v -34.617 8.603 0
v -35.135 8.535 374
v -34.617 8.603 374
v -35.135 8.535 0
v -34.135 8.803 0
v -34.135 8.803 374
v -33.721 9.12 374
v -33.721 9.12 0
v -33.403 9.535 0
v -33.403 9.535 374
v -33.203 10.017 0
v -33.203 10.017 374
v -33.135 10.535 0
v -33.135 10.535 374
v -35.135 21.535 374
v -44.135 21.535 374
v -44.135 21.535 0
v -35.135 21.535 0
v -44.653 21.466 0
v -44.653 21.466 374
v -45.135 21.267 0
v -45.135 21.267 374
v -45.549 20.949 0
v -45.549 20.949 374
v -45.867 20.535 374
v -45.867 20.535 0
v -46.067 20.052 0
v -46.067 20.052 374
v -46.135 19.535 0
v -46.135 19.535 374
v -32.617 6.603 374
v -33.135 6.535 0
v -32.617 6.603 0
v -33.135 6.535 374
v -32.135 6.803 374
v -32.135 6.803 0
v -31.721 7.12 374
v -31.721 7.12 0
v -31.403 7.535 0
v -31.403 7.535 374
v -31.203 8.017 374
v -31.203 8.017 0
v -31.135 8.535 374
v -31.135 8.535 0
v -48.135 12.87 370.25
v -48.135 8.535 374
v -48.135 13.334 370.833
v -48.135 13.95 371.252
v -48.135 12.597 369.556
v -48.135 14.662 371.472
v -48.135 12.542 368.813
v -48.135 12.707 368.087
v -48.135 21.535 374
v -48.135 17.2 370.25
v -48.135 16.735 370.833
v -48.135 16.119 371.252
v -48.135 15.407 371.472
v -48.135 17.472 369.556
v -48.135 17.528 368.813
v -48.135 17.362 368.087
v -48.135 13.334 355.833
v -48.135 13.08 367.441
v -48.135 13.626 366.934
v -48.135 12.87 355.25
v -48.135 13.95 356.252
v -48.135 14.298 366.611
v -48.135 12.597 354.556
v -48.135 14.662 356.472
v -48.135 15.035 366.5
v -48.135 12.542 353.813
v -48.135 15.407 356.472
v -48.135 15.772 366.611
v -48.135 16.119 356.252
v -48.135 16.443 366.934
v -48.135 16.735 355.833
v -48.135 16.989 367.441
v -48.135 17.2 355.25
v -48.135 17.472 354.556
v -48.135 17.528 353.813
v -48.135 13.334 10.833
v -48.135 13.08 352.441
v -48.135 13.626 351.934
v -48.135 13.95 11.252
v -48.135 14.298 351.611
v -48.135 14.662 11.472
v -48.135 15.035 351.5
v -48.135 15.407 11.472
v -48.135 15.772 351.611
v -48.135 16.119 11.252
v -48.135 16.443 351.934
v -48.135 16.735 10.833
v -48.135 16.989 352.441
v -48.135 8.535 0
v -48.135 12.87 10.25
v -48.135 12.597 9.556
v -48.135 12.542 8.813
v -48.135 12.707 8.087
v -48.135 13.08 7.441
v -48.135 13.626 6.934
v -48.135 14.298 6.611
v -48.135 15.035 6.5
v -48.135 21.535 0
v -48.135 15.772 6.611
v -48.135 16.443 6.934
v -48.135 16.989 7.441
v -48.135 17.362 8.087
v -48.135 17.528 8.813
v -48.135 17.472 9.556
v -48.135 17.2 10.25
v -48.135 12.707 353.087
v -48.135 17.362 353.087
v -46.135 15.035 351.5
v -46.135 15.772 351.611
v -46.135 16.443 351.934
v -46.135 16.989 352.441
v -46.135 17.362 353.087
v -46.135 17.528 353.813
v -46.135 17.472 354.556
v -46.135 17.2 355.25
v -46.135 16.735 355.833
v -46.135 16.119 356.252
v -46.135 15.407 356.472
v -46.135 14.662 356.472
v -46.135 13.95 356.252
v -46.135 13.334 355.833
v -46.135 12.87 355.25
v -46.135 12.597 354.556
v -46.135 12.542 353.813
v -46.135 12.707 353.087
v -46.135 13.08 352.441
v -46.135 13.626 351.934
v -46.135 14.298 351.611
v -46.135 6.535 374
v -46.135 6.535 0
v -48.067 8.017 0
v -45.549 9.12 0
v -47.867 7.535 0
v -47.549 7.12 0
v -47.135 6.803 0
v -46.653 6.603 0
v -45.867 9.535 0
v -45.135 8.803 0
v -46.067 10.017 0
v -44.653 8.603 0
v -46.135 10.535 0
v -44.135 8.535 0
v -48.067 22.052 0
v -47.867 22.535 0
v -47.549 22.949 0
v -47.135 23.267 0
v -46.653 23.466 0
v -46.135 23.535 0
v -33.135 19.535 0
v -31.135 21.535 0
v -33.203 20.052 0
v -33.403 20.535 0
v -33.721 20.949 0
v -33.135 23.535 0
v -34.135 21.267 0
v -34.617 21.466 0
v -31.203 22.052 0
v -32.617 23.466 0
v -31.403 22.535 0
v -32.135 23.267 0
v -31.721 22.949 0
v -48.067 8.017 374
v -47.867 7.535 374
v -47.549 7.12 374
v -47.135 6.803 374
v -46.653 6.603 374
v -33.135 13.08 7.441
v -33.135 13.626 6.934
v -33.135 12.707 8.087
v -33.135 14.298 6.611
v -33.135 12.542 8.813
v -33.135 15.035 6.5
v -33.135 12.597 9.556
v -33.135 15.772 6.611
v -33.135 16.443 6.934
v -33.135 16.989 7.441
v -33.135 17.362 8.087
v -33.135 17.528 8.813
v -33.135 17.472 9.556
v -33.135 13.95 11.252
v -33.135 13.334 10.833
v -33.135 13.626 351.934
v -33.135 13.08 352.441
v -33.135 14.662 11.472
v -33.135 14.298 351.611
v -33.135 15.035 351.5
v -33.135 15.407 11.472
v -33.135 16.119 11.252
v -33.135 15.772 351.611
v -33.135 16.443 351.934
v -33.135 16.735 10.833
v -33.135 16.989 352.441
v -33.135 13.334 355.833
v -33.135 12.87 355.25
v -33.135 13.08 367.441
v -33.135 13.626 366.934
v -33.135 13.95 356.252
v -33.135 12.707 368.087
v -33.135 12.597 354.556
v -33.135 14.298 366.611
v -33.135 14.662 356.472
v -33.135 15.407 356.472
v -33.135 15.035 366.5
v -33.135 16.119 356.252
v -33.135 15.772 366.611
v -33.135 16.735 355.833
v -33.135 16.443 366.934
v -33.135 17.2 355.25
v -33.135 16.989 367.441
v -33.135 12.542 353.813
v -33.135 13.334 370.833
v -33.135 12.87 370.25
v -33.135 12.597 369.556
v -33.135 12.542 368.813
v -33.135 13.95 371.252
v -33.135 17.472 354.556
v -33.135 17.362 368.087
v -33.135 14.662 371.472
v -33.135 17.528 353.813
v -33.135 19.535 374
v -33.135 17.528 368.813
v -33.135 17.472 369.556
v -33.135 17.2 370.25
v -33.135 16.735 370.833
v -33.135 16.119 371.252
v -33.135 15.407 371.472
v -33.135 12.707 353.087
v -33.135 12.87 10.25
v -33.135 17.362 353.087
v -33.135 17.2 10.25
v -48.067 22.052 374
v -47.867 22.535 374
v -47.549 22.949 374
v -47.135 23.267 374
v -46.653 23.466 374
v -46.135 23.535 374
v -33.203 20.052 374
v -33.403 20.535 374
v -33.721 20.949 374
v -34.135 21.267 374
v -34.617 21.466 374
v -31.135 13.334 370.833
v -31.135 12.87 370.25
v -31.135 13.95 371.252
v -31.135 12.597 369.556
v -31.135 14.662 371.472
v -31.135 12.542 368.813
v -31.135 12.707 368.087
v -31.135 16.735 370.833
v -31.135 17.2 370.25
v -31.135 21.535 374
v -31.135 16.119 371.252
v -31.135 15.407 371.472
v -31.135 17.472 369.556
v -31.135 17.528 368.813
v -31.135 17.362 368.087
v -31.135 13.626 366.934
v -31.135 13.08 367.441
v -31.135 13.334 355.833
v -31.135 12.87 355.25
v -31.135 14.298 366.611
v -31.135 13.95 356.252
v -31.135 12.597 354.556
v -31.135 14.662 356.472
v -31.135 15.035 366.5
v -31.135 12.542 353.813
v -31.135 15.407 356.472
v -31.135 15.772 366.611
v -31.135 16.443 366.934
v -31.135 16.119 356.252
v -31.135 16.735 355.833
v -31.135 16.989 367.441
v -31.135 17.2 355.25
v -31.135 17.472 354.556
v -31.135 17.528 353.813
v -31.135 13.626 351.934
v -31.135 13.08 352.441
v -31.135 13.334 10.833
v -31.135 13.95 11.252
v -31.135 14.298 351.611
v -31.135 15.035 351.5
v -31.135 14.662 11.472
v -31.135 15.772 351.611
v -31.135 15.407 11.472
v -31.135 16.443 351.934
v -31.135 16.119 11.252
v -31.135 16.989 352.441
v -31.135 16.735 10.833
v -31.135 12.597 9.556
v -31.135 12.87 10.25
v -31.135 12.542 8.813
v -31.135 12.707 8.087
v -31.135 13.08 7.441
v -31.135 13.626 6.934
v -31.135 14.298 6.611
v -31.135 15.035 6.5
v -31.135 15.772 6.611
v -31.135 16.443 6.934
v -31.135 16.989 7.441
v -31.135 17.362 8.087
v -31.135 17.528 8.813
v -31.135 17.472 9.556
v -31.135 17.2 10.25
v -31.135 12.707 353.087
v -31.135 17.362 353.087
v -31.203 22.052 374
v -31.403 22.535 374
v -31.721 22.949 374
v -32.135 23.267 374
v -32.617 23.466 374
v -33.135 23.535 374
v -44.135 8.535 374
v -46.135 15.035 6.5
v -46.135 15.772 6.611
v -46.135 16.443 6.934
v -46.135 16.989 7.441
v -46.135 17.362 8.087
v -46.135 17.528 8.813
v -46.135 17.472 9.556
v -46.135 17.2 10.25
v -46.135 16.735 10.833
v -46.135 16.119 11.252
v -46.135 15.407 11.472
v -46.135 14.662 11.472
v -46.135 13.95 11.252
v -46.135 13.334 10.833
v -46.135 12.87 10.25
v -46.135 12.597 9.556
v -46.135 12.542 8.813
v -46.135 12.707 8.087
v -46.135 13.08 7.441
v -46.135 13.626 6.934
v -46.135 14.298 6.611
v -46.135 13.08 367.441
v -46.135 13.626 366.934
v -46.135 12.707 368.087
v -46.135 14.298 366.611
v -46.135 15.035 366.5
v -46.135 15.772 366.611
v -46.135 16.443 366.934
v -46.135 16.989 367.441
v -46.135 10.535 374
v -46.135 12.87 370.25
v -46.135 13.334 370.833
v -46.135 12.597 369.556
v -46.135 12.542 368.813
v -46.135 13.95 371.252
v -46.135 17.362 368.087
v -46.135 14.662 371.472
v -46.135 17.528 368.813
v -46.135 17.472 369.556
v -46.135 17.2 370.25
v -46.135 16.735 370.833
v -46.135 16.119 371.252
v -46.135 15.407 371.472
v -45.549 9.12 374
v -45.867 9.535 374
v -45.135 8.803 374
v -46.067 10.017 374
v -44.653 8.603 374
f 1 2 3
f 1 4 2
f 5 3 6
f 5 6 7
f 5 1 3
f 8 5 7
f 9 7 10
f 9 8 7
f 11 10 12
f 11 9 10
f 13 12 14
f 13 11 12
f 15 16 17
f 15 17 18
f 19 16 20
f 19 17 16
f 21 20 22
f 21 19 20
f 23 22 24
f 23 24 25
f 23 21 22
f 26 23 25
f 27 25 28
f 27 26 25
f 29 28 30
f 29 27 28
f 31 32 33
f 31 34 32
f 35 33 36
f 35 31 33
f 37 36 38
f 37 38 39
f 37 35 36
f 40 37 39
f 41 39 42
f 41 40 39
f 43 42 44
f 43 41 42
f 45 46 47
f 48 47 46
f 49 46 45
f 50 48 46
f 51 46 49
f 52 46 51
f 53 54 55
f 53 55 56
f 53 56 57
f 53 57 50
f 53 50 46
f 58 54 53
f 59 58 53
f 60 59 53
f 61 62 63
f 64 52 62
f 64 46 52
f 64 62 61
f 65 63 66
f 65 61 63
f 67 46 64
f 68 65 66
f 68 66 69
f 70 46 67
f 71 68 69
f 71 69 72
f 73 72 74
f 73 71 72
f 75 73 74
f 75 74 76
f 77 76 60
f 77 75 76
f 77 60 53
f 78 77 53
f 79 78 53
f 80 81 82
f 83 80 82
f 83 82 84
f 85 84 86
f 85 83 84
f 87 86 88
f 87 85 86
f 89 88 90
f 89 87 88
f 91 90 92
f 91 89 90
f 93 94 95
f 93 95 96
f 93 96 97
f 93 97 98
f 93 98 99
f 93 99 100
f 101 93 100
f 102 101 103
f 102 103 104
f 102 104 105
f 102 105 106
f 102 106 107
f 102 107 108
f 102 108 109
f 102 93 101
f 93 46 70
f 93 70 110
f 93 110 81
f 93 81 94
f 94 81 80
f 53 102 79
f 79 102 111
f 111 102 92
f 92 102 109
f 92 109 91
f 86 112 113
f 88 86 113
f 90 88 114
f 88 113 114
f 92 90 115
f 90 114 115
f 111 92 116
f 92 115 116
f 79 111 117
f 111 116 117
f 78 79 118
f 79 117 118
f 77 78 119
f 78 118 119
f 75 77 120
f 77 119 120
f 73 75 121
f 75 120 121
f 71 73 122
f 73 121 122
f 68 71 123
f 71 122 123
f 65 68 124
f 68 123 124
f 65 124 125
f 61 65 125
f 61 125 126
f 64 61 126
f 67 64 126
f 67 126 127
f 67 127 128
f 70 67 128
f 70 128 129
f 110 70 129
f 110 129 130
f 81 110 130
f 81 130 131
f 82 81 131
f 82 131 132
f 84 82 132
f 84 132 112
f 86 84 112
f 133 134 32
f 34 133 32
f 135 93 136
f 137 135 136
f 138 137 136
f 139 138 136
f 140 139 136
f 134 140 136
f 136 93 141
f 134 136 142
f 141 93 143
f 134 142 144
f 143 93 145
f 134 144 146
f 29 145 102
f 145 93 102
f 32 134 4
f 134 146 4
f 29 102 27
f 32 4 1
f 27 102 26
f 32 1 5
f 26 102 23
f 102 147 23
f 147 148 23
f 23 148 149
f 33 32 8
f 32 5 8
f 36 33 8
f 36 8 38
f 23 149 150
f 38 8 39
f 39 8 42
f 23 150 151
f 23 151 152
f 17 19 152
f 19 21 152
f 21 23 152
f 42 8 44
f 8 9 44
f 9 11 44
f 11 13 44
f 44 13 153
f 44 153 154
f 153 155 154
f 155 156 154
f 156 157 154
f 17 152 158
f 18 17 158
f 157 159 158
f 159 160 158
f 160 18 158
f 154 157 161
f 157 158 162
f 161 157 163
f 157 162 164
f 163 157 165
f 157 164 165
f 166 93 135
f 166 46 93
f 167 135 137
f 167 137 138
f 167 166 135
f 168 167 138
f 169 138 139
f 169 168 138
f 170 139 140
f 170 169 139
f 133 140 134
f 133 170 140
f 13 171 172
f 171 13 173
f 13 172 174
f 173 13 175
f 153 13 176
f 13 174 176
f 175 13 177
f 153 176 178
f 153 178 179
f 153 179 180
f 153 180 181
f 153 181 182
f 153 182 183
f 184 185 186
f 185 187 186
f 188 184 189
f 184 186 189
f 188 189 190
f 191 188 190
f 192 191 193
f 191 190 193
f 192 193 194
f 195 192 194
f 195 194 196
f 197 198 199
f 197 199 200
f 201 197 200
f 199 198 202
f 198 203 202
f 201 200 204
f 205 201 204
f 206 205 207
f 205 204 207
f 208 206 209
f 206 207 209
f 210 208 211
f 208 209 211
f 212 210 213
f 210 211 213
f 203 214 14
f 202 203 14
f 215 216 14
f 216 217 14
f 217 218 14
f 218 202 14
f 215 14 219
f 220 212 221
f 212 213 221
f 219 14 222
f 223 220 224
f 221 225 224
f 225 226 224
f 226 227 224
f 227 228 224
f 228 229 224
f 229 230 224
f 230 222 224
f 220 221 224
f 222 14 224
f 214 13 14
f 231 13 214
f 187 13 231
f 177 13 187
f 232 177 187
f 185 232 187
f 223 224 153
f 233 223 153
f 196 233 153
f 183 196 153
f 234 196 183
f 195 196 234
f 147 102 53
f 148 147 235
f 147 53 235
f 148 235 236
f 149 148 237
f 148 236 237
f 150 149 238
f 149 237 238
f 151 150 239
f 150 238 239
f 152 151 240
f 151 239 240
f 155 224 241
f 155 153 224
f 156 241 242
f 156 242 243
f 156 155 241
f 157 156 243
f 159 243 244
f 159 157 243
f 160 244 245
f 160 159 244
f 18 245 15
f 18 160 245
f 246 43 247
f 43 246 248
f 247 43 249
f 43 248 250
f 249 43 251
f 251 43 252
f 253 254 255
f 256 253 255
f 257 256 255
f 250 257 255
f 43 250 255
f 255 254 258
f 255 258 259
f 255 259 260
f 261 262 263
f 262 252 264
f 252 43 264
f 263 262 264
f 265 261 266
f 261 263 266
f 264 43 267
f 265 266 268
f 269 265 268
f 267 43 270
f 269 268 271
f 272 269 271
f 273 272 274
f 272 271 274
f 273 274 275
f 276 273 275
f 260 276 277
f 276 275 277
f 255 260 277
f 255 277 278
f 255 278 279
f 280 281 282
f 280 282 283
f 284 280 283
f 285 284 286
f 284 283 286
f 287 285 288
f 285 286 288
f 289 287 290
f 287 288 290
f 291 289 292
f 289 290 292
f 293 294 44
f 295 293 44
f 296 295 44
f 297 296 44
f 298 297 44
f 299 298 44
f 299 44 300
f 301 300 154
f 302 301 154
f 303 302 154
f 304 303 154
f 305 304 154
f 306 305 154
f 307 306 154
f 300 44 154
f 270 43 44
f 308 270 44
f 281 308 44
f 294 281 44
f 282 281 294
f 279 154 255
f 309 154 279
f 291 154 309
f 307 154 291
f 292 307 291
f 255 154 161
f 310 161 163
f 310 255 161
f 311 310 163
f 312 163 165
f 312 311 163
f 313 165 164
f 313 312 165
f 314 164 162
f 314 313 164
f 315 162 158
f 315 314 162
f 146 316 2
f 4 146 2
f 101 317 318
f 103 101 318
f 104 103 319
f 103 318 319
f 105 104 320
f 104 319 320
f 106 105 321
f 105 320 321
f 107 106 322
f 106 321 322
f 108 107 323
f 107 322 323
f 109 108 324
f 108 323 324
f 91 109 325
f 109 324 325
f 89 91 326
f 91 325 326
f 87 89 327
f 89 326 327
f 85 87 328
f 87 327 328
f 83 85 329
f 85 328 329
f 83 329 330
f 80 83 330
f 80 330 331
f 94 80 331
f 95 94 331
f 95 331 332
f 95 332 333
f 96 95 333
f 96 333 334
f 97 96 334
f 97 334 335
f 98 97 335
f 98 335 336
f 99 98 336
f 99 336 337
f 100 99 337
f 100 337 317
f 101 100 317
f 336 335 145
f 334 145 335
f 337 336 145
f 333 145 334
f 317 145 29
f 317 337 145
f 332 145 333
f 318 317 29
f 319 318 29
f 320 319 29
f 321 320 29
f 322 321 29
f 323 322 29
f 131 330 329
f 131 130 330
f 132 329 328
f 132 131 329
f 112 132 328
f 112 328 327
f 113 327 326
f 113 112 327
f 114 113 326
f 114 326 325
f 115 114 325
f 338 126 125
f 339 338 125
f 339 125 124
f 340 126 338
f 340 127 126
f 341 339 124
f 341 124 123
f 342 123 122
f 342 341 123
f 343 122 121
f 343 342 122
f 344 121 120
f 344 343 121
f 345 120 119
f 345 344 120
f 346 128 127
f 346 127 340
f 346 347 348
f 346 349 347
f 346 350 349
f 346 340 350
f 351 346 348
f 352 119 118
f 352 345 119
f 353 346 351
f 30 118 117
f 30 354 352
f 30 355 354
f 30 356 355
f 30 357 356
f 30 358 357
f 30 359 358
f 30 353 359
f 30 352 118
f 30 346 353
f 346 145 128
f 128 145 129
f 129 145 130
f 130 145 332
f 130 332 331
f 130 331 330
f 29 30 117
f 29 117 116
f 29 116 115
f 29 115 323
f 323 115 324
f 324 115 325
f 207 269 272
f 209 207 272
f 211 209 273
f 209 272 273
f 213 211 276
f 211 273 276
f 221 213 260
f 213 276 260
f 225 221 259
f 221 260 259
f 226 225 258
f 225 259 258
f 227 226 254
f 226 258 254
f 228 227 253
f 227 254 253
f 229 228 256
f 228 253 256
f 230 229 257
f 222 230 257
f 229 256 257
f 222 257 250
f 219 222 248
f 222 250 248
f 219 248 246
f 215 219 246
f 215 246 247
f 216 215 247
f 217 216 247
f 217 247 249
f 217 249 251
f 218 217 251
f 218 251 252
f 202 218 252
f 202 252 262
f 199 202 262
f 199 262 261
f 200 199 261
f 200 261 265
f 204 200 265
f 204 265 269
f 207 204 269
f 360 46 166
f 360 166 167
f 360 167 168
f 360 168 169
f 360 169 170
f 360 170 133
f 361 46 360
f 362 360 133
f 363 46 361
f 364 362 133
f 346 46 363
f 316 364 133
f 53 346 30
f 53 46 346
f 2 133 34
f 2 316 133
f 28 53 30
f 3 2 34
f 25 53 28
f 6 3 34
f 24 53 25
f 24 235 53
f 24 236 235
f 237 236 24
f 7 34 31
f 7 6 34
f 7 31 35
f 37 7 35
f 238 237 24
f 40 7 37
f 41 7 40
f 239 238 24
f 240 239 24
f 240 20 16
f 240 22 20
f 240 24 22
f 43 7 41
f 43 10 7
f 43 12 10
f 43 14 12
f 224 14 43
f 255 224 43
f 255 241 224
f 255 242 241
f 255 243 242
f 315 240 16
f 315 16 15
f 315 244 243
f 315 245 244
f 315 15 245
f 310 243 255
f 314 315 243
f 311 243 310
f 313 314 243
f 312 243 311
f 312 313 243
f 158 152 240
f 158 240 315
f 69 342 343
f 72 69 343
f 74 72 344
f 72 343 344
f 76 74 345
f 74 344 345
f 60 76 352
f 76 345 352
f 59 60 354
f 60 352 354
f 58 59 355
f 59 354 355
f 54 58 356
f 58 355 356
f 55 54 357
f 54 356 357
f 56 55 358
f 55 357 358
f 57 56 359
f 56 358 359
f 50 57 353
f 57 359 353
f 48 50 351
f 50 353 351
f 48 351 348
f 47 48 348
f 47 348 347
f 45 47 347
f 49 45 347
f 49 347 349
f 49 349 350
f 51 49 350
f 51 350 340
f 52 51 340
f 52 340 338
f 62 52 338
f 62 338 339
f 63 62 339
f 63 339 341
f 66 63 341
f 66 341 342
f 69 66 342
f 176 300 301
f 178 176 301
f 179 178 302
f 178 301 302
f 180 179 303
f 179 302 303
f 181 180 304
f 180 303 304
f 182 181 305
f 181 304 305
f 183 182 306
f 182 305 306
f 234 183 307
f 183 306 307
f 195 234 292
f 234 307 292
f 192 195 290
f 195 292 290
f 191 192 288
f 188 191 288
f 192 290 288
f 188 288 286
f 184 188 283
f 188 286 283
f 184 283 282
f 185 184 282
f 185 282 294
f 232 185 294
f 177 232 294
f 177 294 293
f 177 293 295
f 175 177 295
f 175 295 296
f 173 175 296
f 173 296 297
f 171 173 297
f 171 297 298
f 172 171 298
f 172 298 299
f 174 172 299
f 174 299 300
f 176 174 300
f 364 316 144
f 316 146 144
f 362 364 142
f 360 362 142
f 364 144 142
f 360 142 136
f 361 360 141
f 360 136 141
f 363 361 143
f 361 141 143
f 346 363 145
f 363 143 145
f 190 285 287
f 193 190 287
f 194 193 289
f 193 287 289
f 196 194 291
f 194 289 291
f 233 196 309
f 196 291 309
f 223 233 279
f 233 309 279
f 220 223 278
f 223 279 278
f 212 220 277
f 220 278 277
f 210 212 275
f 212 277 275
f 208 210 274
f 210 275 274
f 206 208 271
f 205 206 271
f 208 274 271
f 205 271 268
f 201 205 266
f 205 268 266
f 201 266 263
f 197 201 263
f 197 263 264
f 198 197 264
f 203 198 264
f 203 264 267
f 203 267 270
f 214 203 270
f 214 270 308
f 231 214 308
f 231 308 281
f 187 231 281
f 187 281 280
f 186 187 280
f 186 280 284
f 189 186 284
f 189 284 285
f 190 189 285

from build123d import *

# Parameters (mm, degrees)
SKETCH1_W      = 17
SKETCH1_H      = 17
EXTRUDE1_DEPTH = 374
FILLET2_R      = 2
SKETCH2_W      = 13
SKETCH2_H      = 13
EXTRUDE2_DEPTH = 375
FILLET3_R      = 2
SKETCH3_R      = 2.5
EXTRUDE3_DEPTH = 18


with BuildPart() as part:
    # Sketch1 → Extrude1 (new body)
    with BuildSketch(Plane.XY):
        with Locations((-39.634997969, 15.034639228)):
            Rectangle(SKETCH1_W, SKETCH1_H)
    extrude(amount=EXTRUDE1_DEPTH)

    # Fillet2
    fillet2_edges = [part.edges().sort_by_distance(p)[0] for p in [
        (-48.134997969, 23.534639228, 187),
        (-31.134997969, 23.534639228, 187),
        (-31.134997969, 6.534639228, 187),
        (-48.134997969, 6.534639228, 187),
    ]]
    fillet(fillet2_edges, radius=FILLET2_R)

    # Sketch2 → Extrude2 (cut, through all)
    with BuildSketch(Plane.XY.offset(374)):
        with Locations((-39.634997969, 15.034639228)):
            Rectangle(SKETCH2_W, SKETCH2_H)
    extrude(amount=-EXTRUDE2_DEPTH, mode=Mode.SUBTRACT)

    # Fillet3
    fillet3_edges = [part.edges().sort_by_distance(p)[0] for p in [
        (-46.134997969, 8.534639228, 187),
        (-46.134997969, 21.534639228, 187),
        (-33.134997969, 21.534639228, 187),
        (-33.134997969, 8.534639228, 187),
    ]]
    fillet(fillet3_edges, radius=FILLET3_R)

    # Sketch3 → Extrude3 (cut, through all)
    with BuildSketch(Plane(origin=(-31.134997969, 0, 0), x_dir=(0, 0, -1), z_dir=(1, 0, 0))):
        with Locations((-369, 15.034639228)):
            Circle(SKETCH3_R)
        with Locations((-354, 15.034639228)):
            Circle(SKETCH3_R)
        with Locations((-9, 15.034639228)):
            Circle(SKETCH3_R)
    extrude(amount=-EXTRUDE3_DEPTH, mode=Mode.SUBTRACT)


solid = part.part
